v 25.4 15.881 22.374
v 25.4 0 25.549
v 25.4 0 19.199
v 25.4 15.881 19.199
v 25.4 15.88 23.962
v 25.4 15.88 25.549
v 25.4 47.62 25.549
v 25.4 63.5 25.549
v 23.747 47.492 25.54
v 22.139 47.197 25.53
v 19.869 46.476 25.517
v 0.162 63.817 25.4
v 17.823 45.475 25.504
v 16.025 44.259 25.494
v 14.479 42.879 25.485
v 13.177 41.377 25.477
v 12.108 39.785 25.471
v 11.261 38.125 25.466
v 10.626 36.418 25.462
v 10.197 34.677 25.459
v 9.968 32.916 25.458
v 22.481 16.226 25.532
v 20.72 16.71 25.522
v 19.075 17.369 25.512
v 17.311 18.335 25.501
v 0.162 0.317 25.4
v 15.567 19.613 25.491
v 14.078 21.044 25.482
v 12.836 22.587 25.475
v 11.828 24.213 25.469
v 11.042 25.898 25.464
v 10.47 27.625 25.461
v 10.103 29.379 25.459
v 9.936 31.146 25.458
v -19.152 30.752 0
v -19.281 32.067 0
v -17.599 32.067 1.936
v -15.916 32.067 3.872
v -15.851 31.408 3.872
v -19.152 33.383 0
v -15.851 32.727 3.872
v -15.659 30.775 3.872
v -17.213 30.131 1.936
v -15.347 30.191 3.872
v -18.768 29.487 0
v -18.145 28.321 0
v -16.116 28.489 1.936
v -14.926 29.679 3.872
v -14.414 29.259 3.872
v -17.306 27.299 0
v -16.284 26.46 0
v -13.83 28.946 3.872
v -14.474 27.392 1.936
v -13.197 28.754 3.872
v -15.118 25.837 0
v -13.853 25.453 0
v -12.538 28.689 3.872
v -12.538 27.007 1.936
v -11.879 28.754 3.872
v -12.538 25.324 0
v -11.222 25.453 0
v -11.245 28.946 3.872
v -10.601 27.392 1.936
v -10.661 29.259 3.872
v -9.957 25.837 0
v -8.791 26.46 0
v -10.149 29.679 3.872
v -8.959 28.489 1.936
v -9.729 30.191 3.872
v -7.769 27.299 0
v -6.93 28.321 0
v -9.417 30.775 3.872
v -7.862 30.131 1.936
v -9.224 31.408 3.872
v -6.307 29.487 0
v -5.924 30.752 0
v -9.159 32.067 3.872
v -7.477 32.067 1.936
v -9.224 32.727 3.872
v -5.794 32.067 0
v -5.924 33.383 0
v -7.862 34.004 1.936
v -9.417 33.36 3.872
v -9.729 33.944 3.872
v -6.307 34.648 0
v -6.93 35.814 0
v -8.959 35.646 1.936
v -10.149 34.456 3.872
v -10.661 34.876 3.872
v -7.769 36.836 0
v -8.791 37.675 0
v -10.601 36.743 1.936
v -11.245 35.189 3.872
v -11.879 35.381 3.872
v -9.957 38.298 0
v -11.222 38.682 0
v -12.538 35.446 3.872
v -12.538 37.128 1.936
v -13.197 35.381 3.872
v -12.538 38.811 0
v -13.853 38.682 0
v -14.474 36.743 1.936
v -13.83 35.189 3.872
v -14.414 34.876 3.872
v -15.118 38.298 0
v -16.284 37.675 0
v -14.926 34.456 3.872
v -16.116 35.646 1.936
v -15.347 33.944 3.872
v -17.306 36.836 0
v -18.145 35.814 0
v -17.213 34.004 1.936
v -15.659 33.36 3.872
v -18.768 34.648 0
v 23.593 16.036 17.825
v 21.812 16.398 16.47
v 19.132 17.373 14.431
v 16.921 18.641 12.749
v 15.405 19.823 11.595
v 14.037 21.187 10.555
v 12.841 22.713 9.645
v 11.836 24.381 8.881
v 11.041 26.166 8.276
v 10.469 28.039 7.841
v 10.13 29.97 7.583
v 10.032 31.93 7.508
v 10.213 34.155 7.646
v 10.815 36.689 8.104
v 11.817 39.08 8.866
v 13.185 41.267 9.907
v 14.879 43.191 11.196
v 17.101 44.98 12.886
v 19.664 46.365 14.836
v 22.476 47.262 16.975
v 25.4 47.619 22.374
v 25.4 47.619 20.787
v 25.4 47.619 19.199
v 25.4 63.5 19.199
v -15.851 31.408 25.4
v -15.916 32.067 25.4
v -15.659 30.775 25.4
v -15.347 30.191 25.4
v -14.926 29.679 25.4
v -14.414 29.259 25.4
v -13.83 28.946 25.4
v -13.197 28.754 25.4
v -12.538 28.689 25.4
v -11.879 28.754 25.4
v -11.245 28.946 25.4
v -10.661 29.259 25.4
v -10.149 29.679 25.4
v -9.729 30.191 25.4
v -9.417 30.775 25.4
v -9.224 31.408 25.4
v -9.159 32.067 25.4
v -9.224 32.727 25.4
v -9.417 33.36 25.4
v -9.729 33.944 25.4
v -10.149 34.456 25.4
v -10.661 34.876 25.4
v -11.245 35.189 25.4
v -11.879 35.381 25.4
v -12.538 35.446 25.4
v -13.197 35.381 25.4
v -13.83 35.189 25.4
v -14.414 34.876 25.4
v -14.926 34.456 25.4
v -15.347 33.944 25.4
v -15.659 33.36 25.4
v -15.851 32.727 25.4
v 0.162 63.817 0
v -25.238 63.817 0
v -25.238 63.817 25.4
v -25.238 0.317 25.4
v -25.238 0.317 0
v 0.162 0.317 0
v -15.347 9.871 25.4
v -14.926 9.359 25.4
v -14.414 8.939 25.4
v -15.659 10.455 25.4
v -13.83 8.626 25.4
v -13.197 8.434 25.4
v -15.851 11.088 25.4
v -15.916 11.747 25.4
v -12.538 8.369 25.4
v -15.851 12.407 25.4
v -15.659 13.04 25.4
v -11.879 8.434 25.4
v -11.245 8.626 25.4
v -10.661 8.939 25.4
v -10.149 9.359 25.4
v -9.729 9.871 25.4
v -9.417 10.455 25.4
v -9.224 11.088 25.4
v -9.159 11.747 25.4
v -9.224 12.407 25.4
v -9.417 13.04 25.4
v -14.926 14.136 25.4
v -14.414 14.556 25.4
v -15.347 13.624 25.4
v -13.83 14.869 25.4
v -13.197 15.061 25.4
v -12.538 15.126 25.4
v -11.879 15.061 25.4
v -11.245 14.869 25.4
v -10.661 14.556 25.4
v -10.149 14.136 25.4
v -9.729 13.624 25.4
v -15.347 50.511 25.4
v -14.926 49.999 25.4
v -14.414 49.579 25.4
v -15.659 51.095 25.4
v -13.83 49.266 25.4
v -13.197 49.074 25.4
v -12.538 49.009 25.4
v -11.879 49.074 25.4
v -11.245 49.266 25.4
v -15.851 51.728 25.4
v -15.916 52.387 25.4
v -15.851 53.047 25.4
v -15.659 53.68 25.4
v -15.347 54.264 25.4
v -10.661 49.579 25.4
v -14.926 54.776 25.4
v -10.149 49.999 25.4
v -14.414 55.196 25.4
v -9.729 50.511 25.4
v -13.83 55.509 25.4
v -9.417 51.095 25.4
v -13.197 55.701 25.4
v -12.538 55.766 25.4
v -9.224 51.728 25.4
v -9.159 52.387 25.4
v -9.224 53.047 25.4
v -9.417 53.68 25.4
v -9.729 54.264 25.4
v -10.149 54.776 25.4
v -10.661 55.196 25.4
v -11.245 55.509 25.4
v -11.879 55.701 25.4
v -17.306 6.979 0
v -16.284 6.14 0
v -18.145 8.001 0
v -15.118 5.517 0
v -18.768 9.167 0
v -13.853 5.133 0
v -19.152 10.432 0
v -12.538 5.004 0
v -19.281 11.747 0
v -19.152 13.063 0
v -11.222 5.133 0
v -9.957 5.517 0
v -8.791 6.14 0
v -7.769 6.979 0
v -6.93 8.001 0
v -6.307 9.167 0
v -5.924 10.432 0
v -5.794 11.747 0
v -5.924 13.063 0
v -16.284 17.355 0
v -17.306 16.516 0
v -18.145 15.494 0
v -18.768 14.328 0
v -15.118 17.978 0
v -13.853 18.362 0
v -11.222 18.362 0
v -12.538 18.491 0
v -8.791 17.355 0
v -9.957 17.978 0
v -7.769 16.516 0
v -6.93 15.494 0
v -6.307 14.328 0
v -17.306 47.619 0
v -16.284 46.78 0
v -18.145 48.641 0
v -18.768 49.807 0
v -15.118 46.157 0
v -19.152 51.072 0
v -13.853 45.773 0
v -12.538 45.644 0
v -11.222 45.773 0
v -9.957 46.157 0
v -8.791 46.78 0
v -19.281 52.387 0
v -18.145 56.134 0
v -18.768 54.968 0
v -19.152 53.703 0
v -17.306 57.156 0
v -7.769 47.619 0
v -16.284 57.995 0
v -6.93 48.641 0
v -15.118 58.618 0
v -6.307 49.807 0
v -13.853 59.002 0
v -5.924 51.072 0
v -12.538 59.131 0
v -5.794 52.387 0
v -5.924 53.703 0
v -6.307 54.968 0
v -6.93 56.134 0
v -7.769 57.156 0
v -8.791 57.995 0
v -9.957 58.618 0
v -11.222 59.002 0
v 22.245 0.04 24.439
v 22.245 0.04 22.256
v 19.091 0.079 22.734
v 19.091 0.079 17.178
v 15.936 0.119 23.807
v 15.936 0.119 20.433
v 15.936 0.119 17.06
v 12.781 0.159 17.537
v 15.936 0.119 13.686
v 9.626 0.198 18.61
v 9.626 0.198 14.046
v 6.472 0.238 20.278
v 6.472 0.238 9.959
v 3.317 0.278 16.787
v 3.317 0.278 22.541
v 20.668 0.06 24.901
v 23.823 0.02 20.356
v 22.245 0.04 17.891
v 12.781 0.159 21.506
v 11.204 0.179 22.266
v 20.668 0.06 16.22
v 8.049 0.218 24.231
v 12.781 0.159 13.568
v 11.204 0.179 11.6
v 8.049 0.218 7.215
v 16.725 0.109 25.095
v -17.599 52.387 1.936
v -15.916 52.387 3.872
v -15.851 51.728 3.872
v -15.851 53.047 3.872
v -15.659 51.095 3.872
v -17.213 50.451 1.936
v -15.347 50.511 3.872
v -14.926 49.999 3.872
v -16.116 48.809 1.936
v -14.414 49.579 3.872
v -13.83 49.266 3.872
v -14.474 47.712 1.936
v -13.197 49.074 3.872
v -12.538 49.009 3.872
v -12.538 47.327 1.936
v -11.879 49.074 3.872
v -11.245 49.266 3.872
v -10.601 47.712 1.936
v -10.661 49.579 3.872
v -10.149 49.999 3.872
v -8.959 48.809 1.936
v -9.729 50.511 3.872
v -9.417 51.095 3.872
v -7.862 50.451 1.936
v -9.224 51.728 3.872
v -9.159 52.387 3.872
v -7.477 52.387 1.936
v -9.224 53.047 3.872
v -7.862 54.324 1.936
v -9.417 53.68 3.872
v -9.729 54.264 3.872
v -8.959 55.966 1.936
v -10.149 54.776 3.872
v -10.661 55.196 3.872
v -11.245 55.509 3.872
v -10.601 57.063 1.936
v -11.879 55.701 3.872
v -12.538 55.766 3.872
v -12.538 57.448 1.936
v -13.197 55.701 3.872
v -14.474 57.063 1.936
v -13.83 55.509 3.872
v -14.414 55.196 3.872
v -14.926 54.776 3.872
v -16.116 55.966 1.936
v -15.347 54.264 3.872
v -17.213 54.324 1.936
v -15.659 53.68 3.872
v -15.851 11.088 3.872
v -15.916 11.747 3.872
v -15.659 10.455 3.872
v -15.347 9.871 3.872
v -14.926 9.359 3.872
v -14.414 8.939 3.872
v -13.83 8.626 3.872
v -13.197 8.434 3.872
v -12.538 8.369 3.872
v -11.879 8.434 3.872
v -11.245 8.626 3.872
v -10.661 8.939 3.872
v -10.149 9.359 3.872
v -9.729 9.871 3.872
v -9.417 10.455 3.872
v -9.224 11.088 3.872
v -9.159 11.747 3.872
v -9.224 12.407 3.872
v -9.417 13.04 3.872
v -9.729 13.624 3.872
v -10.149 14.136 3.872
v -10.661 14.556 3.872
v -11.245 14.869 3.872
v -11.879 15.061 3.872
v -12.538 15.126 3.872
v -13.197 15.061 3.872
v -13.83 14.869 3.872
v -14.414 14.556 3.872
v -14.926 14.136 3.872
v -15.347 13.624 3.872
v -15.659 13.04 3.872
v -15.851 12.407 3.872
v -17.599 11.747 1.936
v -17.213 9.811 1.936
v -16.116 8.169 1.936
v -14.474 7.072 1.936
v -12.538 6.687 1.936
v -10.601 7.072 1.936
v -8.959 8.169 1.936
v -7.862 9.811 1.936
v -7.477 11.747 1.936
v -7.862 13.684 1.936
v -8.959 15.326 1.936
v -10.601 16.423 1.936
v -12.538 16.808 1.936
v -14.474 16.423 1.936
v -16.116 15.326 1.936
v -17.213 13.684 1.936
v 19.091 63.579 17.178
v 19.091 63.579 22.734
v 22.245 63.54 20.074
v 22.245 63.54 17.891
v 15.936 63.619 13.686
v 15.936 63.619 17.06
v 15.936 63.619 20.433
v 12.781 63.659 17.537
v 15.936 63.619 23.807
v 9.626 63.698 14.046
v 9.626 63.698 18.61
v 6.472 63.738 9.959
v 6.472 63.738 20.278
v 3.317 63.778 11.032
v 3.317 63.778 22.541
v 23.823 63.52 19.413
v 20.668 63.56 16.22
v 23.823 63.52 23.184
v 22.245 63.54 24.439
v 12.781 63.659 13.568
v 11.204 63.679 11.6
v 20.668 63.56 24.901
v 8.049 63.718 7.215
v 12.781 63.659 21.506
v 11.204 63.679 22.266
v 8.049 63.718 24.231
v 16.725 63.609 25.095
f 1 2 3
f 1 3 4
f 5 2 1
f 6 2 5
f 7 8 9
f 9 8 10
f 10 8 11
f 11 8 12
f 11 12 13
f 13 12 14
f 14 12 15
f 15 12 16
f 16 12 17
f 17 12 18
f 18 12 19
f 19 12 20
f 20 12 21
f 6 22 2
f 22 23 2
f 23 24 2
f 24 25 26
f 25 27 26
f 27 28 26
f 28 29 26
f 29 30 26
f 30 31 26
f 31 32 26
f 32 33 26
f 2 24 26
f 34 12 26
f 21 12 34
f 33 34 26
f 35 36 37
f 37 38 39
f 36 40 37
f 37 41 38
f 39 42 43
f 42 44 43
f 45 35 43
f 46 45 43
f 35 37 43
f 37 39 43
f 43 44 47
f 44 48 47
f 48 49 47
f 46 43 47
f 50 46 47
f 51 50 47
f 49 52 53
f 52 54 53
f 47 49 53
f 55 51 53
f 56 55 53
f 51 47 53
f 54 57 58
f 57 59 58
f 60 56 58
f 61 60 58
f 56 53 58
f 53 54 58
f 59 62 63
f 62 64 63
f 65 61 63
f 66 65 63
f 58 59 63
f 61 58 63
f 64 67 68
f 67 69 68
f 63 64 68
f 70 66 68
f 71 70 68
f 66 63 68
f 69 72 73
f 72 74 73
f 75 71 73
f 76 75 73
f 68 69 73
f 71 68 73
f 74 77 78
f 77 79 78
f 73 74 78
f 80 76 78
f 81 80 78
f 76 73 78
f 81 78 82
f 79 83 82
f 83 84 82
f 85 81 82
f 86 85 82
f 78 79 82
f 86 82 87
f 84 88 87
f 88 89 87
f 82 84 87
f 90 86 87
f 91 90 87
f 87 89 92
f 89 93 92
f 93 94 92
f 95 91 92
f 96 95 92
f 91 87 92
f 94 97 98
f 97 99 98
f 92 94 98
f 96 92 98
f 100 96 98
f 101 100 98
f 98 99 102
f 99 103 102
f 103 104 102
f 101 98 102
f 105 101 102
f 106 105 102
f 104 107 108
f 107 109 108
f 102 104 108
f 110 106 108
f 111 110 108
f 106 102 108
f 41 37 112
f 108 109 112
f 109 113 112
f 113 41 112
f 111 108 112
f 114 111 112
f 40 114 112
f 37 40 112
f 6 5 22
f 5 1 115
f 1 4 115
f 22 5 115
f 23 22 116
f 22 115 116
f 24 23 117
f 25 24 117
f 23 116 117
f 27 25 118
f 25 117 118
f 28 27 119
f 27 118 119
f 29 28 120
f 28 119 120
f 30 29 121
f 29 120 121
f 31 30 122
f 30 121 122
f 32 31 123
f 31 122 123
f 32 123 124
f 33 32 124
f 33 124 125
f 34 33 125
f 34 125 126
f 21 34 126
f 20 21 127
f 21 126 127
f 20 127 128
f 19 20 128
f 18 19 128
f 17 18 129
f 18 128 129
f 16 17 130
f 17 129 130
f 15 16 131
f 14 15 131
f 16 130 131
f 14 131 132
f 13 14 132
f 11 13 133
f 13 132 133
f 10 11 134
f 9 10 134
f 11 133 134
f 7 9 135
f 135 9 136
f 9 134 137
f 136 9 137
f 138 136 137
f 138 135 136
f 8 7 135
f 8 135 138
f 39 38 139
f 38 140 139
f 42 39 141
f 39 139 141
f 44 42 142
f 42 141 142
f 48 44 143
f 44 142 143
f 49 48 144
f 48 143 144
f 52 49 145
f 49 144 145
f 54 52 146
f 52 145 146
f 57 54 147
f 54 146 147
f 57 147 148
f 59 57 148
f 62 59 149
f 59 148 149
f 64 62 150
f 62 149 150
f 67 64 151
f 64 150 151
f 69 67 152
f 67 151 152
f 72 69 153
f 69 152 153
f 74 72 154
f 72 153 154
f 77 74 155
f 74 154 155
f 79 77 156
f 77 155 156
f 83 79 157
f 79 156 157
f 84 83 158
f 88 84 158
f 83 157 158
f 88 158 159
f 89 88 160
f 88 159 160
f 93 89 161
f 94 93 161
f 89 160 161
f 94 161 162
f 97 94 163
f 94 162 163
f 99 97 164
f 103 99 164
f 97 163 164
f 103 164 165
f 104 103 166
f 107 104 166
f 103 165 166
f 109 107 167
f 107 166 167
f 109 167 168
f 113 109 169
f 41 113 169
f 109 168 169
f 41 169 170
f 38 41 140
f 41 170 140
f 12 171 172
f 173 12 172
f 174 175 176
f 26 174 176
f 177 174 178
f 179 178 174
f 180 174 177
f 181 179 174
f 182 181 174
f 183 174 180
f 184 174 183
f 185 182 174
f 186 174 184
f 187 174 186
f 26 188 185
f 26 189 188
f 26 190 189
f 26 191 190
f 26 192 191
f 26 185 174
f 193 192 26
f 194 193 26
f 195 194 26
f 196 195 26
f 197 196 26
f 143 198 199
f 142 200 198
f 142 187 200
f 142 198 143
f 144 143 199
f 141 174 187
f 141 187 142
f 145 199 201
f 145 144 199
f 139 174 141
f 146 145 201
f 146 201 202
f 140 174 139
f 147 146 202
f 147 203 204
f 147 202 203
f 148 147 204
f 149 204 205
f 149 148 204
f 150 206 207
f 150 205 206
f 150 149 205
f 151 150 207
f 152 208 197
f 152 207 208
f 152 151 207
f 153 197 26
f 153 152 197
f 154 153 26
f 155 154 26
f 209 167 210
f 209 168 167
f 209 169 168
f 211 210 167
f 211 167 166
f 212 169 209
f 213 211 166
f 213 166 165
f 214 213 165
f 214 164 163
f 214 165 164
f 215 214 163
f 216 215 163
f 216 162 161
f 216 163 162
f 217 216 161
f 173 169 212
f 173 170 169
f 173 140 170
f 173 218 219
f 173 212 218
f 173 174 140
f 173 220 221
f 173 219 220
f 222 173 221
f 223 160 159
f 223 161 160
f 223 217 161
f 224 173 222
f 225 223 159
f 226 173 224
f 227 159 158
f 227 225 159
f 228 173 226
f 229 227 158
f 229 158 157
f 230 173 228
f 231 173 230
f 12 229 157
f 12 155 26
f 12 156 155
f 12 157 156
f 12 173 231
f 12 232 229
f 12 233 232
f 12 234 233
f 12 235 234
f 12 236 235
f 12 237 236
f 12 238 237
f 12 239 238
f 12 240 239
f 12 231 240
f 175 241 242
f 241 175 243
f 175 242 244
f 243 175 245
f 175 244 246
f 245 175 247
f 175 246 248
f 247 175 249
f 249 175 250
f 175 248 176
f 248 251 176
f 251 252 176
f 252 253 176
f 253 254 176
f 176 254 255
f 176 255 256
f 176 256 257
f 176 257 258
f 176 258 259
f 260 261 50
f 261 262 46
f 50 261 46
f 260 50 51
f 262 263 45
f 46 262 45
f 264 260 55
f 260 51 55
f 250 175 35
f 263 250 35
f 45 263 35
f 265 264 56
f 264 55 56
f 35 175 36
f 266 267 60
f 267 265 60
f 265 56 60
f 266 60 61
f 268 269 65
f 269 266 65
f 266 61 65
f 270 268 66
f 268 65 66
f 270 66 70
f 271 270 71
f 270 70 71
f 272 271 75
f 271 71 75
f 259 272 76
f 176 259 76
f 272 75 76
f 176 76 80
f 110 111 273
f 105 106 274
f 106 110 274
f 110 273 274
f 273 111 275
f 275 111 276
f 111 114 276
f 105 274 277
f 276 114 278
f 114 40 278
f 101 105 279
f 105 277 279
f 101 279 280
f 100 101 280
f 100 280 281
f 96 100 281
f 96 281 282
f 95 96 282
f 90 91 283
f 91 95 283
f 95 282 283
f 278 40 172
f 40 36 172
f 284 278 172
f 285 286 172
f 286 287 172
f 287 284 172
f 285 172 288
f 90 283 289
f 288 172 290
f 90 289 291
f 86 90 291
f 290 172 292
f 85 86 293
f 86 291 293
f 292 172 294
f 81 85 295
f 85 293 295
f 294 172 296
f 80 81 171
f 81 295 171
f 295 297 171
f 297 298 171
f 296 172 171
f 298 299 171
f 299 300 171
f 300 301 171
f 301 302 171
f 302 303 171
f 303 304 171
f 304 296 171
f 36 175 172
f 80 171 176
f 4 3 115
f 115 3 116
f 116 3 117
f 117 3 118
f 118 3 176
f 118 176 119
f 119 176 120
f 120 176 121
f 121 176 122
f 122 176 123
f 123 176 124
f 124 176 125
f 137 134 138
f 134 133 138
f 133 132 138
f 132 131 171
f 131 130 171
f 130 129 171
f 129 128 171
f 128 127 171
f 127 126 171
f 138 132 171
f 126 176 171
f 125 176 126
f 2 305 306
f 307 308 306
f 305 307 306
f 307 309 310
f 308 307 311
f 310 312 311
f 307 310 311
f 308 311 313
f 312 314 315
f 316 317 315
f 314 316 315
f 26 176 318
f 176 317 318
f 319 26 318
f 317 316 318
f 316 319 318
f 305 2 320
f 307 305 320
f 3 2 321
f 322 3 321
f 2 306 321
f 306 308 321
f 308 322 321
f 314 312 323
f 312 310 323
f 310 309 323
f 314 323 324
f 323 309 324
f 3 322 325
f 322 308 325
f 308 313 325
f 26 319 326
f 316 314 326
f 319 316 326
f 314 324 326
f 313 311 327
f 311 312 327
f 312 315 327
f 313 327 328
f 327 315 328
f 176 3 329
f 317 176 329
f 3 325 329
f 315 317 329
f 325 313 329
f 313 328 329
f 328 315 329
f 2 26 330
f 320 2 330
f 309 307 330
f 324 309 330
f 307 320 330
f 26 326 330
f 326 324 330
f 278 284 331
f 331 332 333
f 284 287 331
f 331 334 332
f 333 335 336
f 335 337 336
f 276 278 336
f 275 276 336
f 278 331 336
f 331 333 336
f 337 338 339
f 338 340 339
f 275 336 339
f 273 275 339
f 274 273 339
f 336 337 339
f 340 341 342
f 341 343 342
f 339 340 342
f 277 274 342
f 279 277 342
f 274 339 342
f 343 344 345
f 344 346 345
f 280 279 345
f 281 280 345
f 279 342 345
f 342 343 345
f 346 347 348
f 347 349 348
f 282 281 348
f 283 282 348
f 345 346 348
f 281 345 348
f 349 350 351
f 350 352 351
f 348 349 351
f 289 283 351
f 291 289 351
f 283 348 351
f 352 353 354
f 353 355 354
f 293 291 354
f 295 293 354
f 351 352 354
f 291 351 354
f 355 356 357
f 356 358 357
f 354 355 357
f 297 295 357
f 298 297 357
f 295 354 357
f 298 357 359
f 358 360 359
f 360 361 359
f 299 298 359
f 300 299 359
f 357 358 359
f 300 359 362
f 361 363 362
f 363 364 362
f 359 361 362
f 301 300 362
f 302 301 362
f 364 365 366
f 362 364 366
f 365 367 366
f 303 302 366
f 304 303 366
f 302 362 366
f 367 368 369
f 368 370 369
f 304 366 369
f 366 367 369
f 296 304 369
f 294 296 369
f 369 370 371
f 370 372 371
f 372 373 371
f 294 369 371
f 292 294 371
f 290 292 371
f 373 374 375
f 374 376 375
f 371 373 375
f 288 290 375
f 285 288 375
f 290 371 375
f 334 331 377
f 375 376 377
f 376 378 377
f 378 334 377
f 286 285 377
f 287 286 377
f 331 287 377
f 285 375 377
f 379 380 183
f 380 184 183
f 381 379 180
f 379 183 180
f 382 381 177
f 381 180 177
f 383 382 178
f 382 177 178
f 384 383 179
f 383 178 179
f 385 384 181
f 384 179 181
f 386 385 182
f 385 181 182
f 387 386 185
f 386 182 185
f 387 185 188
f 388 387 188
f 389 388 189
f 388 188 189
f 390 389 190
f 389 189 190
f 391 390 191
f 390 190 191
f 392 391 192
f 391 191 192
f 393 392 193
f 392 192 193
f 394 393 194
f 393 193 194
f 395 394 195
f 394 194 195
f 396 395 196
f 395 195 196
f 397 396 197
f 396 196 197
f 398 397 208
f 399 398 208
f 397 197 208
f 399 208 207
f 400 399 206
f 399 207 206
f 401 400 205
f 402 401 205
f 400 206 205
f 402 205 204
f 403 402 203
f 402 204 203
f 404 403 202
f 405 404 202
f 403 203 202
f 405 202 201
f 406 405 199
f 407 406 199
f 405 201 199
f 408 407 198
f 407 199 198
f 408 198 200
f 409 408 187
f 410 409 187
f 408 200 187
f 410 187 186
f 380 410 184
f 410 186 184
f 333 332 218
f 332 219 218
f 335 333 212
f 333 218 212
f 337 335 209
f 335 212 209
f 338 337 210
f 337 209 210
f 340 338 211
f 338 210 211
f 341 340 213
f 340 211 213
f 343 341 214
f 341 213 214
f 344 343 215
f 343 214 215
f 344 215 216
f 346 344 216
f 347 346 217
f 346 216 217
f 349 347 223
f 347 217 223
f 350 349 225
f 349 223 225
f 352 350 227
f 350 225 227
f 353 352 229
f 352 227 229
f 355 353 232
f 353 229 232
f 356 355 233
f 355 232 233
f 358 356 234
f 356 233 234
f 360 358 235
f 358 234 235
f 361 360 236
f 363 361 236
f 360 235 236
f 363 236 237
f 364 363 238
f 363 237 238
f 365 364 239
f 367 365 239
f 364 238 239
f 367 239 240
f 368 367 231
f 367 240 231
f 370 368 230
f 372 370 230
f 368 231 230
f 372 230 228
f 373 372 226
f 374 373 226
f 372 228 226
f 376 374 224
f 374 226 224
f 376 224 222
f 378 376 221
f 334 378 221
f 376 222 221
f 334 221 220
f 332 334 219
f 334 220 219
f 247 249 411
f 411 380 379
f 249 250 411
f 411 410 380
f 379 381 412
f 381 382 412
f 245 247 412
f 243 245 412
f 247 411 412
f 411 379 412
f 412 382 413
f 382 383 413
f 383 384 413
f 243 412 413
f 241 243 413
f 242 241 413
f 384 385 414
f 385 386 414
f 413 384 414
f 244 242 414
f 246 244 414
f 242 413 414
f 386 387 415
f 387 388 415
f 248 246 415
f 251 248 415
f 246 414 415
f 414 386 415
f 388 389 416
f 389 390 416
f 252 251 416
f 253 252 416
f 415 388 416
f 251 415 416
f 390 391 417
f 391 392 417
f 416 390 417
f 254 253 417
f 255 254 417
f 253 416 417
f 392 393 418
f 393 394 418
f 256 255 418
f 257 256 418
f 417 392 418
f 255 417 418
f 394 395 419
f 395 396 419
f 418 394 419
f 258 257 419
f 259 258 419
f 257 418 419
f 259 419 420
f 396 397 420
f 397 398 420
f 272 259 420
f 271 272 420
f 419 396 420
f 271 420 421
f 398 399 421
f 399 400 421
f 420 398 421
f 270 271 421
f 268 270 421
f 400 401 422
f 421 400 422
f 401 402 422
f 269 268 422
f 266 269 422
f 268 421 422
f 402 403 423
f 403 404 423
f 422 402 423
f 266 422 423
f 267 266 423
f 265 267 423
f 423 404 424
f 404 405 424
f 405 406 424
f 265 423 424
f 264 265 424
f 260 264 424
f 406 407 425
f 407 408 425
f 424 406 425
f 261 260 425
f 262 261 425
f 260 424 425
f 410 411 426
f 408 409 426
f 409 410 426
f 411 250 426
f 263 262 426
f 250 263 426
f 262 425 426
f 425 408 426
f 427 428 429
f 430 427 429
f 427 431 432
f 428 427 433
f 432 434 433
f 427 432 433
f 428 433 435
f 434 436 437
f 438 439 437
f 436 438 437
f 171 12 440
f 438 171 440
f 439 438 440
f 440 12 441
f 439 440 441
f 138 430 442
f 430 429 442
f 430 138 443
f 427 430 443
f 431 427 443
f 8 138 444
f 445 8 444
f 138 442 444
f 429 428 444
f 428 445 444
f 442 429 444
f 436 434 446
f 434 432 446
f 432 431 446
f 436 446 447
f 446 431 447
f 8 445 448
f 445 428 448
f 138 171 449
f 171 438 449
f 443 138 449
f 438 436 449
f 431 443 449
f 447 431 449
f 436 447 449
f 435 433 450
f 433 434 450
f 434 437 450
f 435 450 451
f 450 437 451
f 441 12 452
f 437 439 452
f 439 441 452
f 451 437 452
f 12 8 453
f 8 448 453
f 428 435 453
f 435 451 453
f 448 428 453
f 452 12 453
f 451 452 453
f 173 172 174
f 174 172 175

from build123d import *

# Parameters (mm, degrees)
F1_DEPTH       = 25.4
F2_D           = 6.7564
F2_CSINK_D     = 13.4874
F2_CSINK_ANGLE = 82
F4_W           = 63.5
F4_H           = 6.35
F1_FACE_W      = 63.5
F1_FACE_H      = 25.4
F7_D           = 31.75


with BuildPart() as f1:
    # F0 (on Top) → F1 (new body)
    with BuildSketch(Plane.XY):
        Polygon((0.1623489741, 63.8174524204), (-25.2376510259, 63.8174524204), (-25.2376510259, 0.3174524204), (-12.5376510259, 0.3174524204), (0.1623489741, 0.3174524204), align=None)
    extrude(amount=F1_DEPTH)

    # F2 (through all)
    with Locations(Plane(origin=(0, 0, 0), x_dir=(1, 0, 0), z_dir=(0, 0, -1))):
        with Locations((-12.5376510259, -11.7474524204), (-12.5376510259, -32.0674524204), (-12.5376510259, -52.3874524204)):
            CounterSinkHole(F2_D / 2, F2_CSINK_D / 2, counter_sink_angle=F2_CSINK_ANGLE)

    # F4 (on offset) → F5 section 0
    with BuildSketch(Plane.YZ.offset(25.4)):
        with Locations((31.75, 22.3743102956)):
            Rectangle(F4_W, F4_H)
    # F1_face (on face) → F5 section 1
    with BuildSketch(Plane(origin=(0.1623489741, 32.0674524204, 12.7), x_dir=(0, 1, 0), z_dir=(1, 0, 0))):
        Rectangle(F1_FACE_W, F1_FACE_H)
    loft()

    # F7 (through all)
    with Locations(Plane(origin=(-0.1502598385, 0, 25.3981505524), x_dir=(0.9999824999, 0, 0.0059160689), z_dir=(-0.0059160689, 0, 0.9999824999))):
        with Locations((25.9500681529, 31.75)):
            Hole(F7_D / 2)


solid = f1.part
